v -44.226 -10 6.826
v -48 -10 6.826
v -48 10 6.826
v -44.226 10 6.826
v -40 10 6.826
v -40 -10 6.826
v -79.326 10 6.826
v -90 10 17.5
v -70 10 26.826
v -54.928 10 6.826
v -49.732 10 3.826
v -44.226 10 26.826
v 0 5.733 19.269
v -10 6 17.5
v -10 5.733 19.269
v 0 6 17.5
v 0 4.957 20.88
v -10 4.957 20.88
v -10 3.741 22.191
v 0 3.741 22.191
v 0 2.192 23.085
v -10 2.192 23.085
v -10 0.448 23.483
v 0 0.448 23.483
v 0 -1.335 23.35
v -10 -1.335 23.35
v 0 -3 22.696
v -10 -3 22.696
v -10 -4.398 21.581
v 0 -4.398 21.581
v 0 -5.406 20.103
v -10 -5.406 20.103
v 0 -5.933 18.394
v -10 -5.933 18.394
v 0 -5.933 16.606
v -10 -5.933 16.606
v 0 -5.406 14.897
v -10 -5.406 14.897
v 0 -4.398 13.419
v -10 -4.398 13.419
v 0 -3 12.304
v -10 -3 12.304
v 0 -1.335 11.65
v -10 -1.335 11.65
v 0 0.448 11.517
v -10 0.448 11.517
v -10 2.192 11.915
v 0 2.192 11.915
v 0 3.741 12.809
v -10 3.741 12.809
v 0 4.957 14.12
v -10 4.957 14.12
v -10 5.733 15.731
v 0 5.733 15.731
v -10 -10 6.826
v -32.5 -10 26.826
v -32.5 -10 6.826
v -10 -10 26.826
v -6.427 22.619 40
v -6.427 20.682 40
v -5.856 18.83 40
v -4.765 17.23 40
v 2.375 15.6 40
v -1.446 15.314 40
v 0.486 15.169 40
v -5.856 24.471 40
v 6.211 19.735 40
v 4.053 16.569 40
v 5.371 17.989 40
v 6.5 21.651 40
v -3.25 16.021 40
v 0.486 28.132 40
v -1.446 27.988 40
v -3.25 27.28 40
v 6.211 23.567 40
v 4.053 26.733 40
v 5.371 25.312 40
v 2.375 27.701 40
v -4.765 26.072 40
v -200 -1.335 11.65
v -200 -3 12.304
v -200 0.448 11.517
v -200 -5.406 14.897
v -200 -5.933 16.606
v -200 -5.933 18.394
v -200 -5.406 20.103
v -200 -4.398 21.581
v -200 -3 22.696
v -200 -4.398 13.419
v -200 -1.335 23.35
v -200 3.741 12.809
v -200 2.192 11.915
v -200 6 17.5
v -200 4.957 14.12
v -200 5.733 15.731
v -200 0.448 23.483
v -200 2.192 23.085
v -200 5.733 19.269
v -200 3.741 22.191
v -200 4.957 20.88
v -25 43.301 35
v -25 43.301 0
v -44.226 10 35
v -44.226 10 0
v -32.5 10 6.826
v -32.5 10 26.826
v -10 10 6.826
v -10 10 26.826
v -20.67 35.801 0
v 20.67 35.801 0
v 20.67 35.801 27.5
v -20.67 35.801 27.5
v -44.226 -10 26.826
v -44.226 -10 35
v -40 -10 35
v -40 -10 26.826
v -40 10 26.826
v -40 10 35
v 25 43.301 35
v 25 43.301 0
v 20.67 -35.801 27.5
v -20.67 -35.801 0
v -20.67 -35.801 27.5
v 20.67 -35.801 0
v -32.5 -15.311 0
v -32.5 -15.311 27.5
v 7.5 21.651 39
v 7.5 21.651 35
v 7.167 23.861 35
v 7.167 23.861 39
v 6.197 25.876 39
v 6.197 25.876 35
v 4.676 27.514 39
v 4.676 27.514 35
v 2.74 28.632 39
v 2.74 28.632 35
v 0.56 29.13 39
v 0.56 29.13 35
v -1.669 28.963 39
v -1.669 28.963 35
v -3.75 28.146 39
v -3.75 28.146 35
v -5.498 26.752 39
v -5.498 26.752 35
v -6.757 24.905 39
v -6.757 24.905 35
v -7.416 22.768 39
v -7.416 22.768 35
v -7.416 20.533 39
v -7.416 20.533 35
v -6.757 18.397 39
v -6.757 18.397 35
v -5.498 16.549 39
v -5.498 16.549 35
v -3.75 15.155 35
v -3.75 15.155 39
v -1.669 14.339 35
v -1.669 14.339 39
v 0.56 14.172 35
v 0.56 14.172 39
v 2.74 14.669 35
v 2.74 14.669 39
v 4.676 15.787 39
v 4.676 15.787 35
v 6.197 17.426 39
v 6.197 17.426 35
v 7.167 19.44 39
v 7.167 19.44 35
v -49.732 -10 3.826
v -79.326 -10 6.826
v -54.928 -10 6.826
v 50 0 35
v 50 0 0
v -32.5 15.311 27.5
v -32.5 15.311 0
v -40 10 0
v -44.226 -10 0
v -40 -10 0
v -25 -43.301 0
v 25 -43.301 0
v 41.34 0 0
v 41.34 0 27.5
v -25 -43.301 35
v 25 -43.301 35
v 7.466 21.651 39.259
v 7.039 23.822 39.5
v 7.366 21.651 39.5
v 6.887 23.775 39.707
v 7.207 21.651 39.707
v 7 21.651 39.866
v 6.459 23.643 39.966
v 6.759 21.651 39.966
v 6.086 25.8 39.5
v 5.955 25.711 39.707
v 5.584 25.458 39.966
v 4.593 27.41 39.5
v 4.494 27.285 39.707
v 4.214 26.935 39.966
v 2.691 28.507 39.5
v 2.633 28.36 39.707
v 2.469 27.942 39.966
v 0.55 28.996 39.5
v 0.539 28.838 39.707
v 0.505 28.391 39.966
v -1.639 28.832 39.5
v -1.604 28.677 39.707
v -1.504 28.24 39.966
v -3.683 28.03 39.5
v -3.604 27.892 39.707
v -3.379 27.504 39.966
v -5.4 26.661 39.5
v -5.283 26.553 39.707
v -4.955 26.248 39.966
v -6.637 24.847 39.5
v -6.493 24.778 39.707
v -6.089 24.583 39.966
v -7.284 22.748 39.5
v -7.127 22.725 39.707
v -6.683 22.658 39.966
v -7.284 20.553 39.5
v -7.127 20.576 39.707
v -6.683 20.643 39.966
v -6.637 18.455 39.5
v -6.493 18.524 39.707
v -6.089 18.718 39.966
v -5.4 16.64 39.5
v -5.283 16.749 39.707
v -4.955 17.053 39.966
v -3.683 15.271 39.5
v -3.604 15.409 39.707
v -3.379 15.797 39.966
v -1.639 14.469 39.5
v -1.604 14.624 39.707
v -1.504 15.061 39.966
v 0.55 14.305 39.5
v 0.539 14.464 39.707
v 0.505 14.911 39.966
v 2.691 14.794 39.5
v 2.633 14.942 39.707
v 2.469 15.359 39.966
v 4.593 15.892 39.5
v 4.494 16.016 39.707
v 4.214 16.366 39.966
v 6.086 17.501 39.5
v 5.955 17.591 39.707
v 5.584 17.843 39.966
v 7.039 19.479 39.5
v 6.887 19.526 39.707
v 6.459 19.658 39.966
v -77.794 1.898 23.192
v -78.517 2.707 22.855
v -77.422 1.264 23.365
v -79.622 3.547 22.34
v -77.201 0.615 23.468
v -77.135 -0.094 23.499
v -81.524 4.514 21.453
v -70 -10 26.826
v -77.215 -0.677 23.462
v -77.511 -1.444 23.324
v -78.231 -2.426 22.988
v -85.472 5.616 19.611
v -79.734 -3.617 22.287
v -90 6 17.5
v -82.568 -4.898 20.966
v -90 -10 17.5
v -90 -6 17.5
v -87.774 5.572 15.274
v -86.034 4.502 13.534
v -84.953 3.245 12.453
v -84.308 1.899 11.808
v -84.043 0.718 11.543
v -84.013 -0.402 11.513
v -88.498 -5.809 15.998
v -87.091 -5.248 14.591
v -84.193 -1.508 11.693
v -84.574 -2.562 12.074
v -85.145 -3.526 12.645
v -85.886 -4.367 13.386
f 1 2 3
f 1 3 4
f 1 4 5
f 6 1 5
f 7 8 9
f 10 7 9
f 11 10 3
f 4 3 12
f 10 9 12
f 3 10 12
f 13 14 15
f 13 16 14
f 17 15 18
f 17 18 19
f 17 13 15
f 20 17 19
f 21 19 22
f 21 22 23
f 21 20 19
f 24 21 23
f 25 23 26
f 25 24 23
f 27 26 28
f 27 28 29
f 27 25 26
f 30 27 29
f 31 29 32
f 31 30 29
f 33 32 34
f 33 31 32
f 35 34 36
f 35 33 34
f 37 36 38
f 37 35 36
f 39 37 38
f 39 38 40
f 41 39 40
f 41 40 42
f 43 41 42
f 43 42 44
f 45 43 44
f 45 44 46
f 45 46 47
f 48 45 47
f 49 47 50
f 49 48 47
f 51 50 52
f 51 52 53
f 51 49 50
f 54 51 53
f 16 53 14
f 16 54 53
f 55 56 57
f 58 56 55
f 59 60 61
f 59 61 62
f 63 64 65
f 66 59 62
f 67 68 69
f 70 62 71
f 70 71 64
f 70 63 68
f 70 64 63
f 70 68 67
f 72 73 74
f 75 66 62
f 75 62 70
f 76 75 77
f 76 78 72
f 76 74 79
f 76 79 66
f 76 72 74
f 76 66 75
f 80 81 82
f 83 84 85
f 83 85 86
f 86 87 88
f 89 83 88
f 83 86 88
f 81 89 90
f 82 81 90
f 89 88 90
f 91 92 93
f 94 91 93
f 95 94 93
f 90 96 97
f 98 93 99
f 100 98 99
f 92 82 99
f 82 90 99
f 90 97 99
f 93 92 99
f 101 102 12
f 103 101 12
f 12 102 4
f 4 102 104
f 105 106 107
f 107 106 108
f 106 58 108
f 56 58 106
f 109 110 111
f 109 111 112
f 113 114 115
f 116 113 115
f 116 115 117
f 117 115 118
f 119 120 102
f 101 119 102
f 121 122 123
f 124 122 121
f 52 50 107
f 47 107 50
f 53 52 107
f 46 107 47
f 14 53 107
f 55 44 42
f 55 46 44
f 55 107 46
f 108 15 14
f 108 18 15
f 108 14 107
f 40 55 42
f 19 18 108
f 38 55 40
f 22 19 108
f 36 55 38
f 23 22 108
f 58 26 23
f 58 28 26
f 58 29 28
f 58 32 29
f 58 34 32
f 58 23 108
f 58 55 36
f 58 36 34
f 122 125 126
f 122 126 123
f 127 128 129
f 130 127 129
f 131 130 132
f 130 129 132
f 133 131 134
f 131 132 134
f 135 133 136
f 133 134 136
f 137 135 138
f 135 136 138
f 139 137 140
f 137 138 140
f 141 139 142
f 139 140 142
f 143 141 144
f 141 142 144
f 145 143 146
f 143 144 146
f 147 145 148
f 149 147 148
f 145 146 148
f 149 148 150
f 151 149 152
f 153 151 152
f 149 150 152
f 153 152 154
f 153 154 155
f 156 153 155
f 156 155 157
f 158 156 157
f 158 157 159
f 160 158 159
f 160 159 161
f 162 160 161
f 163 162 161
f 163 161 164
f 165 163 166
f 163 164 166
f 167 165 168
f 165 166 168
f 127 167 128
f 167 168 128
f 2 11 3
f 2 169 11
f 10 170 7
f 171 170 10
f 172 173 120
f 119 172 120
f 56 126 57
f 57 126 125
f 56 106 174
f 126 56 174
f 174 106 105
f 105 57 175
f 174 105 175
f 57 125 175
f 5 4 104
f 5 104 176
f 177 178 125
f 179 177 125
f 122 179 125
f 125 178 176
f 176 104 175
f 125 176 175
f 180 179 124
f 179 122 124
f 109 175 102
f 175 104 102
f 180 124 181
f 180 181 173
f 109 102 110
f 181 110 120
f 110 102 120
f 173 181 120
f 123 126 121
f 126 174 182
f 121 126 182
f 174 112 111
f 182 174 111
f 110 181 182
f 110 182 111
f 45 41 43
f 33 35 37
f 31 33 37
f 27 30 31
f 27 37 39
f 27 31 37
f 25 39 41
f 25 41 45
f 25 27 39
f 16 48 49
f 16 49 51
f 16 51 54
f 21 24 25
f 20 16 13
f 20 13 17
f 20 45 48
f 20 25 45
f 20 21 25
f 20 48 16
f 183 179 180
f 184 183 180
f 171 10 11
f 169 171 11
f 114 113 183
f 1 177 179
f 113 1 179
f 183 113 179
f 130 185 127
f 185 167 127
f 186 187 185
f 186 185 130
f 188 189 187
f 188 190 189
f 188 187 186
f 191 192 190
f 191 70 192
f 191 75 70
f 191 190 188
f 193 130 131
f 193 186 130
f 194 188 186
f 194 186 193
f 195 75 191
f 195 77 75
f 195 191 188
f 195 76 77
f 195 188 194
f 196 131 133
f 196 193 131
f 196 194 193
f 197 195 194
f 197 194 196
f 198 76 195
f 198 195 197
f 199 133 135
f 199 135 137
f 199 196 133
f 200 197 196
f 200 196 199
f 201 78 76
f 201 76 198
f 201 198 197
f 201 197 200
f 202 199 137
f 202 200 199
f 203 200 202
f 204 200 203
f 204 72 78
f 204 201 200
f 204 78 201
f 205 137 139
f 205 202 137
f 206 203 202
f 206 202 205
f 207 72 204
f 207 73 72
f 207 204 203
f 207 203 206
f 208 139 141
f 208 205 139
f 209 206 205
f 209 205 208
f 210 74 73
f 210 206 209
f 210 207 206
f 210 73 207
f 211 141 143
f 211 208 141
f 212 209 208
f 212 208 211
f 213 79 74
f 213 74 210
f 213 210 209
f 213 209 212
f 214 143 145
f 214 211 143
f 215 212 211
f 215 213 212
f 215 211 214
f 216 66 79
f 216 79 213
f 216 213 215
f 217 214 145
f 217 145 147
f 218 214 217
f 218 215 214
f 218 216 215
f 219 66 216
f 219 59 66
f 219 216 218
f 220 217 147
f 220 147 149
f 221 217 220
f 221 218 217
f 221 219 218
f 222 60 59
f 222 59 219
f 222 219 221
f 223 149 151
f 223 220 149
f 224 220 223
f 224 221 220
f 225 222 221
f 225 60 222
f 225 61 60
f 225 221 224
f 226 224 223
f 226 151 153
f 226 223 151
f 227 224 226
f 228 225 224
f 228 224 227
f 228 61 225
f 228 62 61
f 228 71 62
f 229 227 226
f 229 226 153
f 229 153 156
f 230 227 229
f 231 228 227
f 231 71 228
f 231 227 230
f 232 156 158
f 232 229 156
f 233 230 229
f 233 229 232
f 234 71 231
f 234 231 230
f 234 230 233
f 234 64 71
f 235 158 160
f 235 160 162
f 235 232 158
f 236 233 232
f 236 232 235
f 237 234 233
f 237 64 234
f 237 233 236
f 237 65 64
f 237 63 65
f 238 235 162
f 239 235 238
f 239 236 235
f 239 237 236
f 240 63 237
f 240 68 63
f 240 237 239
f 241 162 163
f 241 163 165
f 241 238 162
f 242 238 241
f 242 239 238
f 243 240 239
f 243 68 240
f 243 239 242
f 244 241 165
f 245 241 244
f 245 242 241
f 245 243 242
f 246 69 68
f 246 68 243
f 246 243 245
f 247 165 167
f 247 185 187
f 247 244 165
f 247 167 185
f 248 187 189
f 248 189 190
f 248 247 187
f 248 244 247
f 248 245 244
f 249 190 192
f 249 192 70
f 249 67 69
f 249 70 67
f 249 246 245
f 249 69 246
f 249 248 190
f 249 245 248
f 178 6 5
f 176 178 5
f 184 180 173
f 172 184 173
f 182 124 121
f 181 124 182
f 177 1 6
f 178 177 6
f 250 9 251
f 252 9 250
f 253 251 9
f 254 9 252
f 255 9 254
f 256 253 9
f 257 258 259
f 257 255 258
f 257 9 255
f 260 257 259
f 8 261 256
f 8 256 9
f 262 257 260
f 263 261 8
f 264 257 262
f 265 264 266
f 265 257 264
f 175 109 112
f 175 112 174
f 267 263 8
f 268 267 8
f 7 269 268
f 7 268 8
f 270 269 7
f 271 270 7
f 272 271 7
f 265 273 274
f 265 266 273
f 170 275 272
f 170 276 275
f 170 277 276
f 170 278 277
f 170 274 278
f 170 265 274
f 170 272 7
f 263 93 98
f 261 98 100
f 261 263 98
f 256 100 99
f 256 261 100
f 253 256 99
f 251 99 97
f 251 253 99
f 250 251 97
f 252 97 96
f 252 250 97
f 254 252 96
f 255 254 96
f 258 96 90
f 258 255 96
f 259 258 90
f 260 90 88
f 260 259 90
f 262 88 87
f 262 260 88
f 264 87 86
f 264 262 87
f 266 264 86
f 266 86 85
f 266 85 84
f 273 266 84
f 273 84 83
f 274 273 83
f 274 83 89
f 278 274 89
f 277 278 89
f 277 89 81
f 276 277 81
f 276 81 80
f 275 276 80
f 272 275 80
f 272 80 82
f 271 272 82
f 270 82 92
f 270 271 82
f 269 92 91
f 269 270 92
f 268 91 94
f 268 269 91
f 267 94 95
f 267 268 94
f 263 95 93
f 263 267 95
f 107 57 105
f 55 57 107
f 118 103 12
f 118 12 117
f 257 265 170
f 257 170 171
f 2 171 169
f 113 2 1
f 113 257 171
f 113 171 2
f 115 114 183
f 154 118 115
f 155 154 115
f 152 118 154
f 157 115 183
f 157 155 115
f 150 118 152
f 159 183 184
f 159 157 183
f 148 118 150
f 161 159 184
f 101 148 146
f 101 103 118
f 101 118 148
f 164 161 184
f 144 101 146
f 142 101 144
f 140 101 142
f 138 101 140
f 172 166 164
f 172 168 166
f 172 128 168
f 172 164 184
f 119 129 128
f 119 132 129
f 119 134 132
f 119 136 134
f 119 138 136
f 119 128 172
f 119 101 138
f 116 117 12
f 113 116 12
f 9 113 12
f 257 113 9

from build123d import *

# Parameters (mm, degrees)
F1_DEPTH    = 35
F2_R        = 7.5
F3_DEPTH    = 5
F4_R        = 1
F5_W        = 20
F5_H        = 20
F6_DEPTH    = 35.001
F7_T        = 7.5
F7_T3_DEPTH = 50
F10_DEPTH   = 10
F9_R        = 6
F11_DEPTH   = 200


# Not quite as in the source:
# - a shell that OpenCascade refuses in one call is made with other operations: the cavity is built on its own and cut out


with BuildPart() as f1:
    # F0 (on Top) → F1 (new body)
    with BuildSketch(Plane.XY):
        Polygon((25, 43.3012701892), (-25, 43.3012701892), (-50, 0), (-25, -43.3012701892), (25, -43.3012701892), (50, 0), align=None)
    extrude(amount=F1_DEPTH)

    # F2 (on face) → F3 (join)
    with BuildSketch(Plane.XY.offset(35)):
        with Locations((0, 21.6506350946)):
            Circle(F2_R)
    extrude(amount=F3_DEPTH)

    # F4
    f4_edges = [f1.edges().sort_by_distance(p)[0] for p in [
        (-7.5, 21.650635, 40),
    ]]
    fillet(f4_edges, radius=F4_R)

    # F5 (on face) → F6 (cut, through all)
    with BuildSketch(Plane.XY.offset(35)):
        with Locations((-50, 0)):
            Rectangle(F5_W, F5_H)
    extrude(amount=-F6_DEPTH, mode=Mode.SUBTRACT)

    # F7: shell of thickness 7.5, made by hand


with BuildPart() as f7_core1:
    # F7_t2: copy of F1
    add(f1.part)

    # the walls: a layer under each face that stays
    f7_faces = [f7_core1.faces().sort_by_distance(p)[0] for p in [
        (2.8867513459, 0, 35),
        (0, 21.6506350946, 40),
        (37.5, 21.6506350946, 17.5),
        (37.5, -21.6506350946, 17.5),
        (0, -43.3012701892, 17.5),
        (-34.6132486541, -26.6506350946, 17.5),
        (-42.1132486541, -10, 17.5),
        (-40, 0, 17.5),
        (-42.1132486541, 10, 17.5),
        (-34.6132486541, 26.6506350946, 17.5),
        (0, 43.3012701892, 17.5),
    ]]
    thicken(f7_faces, amount=-F7_T, mode=Mode.SUBTRACT)

    # F7_s4 → F7_t3 (cut)
    with BuildSketch(Plane.XY.offset(-7.5)):
        Polygon((-40.075, -9.925), (-40, -17.5), (-32.5, -17.5), (-32.5, -10), align=None)
        Polygon((-40.075, 9.925), (-32.5, 10), (-32.5, 17.5), (-40, 17.5), align=None)
    extrude(amount=F7_T3_DEPTH, mode=Mode.SUBTRACT)

    # F7_s5 → F7_t6 (revolve, cut)
    with BuildSketch(Plane.XZ.offset(-21.6506350946)):
        Polygon((7.575, 35.075), (0, 35), (0, 27.5), (7.5, 27.5), align=None)
    revolve(axis=Axis((0, 21.6506350946, 35), (0, 0, 1)), mode=Mode.SUBTRACT)


with BuildPart() as f1_1:
    add(f1.part)

    # what is left inside the walls is the cavity
    f7_cavity = [f7_core1.part.solids().sort_by_distance(p)[0] for p in [
        (4.419873, -11.933757, 27.425),
    ]]
    add(f7_cavity, mode=Mode.SUBTRACT)

    # F8 (on Front) → F10 (join, symmetric)
    with BuildSketch(Plane.XZ):
        Polygon((-10, 6.8261531631), (-10, 26.8261531631), (-70, 26.8261531631), (-90, 17.5), (-79.3261531631, 6.8261531631), (-54.9282032303, 6.8261531631), (-49.7320508076, 3.8261531631), (-48, 6.8261531631), align=None)
    extrude(amount=F10_DEPTH, both=True)

    # F9 (on Right) → F11 (join)
    with BuildSketch(Plane.YZ):
        with Locations((0, 17.5)):
            Circle(F9_R)
    extrude(amount=-F11_DEPTH)


solid = f1_1.part
